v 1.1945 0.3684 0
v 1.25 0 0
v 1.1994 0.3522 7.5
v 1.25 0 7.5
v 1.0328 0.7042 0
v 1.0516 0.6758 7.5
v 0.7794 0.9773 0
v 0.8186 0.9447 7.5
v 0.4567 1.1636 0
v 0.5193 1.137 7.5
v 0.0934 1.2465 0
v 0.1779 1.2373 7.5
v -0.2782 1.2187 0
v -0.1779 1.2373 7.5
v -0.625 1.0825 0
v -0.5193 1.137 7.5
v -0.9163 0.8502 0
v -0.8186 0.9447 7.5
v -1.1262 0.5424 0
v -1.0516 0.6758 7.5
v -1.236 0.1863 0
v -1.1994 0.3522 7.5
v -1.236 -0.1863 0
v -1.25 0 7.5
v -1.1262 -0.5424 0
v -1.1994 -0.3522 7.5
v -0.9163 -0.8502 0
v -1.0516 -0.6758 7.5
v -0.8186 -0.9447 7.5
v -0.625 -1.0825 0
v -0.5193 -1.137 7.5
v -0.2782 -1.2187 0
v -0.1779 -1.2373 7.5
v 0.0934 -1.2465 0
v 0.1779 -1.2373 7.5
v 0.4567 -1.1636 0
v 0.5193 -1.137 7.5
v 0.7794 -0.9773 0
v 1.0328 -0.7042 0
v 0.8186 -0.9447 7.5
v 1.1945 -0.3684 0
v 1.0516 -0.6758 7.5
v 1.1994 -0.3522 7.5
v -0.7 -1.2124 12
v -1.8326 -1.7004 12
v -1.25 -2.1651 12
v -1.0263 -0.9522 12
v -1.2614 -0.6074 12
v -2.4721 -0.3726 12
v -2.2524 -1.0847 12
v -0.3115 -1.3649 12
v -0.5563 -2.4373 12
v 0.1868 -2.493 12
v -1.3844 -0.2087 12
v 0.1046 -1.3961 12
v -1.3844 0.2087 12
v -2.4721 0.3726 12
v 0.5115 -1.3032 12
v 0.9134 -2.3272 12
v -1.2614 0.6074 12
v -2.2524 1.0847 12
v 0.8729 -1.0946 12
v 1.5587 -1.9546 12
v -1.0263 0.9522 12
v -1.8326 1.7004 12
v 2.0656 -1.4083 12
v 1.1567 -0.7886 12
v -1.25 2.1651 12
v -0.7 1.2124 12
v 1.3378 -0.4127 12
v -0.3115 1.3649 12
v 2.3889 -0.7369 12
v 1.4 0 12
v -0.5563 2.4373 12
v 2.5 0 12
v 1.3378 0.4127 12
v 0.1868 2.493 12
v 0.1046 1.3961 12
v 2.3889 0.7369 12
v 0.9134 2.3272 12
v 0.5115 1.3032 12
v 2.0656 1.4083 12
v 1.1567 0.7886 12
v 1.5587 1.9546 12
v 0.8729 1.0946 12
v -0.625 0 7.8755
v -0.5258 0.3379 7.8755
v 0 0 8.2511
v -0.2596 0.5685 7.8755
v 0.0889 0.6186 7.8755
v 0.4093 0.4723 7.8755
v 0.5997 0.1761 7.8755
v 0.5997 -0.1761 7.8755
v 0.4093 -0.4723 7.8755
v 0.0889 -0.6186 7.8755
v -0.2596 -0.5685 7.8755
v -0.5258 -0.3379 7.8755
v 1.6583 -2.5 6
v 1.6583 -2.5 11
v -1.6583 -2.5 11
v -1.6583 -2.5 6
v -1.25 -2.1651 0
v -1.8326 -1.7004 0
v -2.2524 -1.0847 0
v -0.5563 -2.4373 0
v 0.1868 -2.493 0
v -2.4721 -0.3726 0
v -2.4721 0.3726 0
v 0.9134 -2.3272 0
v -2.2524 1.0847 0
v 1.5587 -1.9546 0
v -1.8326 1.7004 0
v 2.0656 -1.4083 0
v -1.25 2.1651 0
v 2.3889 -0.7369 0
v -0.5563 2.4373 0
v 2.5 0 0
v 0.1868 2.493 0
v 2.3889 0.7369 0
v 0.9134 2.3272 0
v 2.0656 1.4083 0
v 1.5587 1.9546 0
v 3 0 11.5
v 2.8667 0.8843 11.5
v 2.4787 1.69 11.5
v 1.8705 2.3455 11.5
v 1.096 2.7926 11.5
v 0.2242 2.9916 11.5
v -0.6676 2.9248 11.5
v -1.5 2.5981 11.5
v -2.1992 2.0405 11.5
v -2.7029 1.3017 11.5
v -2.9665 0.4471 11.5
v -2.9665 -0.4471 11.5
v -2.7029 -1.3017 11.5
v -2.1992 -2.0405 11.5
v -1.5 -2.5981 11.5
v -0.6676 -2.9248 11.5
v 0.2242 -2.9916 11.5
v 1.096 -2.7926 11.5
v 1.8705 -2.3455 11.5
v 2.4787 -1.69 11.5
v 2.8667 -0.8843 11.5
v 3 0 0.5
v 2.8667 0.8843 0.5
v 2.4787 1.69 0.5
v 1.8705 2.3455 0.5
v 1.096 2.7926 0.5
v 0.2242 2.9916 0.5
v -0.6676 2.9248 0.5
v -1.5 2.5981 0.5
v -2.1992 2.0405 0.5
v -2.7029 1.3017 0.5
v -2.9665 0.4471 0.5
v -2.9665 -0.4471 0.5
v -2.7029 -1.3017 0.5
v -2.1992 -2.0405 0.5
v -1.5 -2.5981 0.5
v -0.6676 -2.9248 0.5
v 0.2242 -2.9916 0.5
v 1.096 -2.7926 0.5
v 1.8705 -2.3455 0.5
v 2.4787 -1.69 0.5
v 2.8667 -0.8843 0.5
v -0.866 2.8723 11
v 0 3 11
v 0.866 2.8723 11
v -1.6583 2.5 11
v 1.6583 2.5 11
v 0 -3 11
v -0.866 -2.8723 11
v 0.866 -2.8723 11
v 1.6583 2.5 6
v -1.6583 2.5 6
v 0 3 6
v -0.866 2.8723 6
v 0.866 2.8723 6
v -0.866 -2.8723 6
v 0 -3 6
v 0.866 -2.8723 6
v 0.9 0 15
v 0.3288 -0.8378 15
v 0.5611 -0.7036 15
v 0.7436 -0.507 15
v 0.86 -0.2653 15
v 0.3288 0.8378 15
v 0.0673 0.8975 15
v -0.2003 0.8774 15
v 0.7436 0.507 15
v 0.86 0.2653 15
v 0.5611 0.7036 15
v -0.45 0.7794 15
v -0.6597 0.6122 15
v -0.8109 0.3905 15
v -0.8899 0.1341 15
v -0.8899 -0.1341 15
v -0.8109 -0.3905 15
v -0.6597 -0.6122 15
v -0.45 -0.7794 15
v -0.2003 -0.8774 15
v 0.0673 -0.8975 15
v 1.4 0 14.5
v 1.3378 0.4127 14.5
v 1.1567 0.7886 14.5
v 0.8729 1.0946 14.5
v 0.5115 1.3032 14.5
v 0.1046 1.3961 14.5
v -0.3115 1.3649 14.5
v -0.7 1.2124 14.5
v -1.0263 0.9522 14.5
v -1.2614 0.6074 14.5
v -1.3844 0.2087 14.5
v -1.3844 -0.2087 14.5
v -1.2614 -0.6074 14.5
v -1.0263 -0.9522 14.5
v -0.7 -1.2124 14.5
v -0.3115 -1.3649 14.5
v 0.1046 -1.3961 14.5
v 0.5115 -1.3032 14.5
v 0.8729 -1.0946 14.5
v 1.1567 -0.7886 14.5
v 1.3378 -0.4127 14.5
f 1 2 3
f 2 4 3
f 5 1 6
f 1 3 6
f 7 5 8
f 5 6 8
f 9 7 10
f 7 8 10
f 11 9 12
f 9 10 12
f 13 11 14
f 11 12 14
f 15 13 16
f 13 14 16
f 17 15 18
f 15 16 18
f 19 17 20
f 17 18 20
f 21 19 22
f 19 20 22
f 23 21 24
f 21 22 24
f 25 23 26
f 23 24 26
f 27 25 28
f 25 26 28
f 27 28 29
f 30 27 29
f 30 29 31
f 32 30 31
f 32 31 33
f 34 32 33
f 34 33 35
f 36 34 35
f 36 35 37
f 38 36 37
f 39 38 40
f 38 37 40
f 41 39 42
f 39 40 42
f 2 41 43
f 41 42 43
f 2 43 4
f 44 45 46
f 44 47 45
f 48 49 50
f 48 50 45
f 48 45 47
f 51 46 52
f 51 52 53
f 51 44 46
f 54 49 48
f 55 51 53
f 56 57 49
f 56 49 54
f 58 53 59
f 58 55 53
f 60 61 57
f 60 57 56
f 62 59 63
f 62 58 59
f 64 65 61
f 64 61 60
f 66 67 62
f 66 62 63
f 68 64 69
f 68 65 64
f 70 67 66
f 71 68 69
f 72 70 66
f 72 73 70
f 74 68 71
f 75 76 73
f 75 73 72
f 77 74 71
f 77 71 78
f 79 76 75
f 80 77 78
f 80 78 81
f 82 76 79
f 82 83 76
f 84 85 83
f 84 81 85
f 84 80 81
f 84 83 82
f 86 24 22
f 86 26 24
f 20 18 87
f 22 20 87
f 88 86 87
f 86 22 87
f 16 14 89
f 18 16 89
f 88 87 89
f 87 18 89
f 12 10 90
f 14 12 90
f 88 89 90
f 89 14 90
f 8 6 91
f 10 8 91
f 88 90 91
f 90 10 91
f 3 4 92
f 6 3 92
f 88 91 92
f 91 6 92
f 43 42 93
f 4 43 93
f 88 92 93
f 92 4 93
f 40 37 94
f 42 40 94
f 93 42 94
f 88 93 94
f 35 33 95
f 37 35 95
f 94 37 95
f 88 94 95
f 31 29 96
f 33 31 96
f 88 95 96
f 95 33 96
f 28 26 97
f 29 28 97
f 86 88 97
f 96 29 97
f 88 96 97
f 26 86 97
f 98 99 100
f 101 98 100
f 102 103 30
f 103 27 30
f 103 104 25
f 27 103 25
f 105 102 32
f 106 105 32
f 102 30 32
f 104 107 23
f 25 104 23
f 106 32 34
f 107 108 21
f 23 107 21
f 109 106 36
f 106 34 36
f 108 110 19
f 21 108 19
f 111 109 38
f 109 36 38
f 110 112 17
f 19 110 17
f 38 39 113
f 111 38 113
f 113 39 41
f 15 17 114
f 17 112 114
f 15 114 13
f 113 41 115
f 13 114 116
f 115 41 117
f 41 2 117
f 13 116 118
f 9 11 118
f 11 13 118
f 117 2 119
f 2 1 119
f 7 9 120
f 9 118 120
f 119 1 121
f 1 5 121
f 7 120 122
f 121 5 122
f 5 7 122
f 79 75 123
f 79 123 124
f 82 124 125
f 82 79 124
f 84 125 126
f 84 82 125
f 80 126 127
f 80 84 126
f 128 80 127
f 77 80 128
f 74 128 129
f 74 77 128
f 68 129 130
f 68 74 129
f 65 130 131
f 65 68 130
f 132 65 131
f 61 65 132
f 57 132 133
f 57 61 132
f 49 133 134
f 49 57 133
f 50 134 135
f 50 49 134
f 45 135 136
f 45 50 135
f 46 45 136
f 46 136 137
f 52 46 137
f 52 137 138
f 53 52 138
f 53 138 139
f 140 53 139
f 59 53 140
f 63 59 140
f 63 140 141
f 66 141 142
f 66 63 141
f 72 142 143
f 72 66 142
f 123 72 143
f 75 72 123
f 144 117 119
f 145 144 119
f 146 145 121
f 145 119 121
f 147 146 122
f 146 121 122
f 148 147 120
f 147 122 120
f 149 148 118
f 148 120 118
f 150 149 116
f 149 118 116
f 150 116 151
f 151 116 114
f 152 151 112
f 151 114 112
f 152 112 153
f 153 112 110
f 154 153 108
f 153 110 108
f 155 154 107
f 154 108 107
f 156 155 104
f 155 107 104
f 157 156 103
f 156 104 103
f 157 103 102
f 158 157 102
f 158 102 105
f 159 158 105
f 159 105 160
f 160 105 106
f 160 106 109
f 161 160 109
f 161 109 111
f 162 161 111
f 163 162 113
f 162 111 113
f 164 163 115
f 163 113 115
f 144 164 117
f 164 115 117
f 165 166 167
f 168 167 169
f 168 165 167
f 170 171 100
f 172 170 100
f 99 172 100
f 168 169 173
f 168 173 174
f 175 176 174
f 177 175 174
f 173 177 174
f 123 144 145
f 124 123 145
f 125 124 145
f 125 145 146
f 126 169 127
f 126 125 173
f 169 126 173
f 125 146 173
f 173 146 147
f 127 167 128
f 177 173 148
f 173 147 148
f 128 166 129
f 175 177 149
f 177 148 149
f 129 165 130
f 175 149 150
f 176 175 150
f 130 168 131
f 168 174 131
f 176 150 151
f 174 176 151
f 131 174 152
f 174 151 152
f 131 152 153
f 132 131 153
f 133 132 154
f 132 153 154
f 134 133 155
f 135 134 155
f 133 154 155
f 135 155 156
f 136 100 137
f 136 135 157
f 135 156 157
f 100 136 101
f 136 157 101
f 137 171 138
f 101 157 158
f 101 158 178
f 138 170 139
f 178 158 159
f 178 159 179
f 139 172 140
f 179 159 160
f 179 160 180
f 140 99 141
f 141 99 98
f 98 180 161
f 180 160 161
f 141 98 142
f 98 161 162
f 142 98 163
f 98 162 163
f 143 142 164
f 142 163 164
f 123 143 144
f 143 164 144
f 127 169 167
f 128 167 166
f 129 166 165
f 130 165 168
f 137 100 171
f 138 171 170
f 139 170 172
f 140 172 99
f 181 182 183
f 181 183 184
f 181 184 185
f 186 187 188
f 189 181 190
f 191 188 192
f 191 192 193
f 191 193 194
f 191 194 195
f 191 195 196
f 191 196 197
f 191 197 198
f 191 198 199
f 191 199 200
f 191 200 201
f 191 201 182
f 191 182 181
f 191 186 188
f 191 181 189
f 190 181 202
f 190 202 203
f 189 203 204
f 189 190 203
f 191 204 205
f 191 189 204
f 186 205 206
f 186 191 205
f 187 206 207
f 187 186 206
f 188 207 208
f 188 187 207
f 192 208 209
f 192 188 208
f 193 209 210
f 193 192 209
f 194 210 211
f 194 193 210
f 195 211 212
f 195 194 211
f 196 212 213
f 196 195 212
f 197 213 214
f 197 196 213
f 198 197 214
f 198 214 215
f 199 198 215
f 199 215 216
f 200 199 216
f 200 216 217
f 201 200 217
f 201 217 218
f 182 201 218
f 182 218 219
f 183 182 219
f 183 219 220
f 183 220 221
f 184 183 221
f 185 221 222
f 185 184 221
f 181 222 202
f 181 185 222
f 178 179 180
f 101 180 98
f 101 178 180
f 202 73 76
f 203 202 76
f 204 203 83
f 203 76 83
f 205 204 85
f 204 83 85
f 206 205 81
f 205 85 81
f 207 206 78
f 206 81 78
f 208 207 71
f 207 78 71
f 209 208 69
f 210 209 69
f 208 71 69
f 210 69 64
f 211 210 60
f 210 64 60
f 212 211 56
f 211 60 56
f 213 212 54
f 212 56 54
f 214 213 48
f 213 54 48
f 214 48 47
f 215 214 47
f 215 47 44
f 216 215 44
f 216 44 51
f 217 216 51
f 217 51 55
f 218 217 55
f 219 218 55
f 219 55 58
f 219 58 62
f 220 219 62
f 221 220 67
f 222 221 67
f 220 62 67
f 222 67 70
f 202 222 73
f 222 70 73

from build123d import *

# Parameters (mm, degrees)
SKETCH_1_R             = 3
EXTRUDE_1_DEPTH        = 12
SKETCH_2_R             = 1.4
EXTRUDE_2_DEPTH        = 3
CHAMFER_1_SIZE         = 0.5
HOLE_WIZARD_M3_1_D     = 2.5
HOLE_WIZARD_M3_1_DEPTH = 7.5
HOLE_WIZARD_M3_1_TIP   = 0.751075774
SKETCH_7_W             = 9.702446008
SKETCH_7_H             = 5
CUT_EXTRUDE_1_DEPTH    = 0.5


with BuildPart() as part:
    # 草图1 → 凸台-拉伸1 (new body)
    with BuildSketch(Plane.XY):
        Circle(SKETCH_1_R)
    extrude(amount=EXTRUDE_1_DEPTH)

    # 草图2 → 凸台-拉伸2 (add)
    with BuildSketch(Plane.XY.offset(12)):
        Circle(SKETCH_2_R)
    extrude(amount=EXTRUDE_2_DEPTH)

    # 倒角1
    chamfer_1_edges = [part.edges().sort_by_distance(p)[0] for p in [
        (-3, 0, 0),
        (-3, 0, 12),
        (-1.4, 0, 15),
    ]]
    chamfer(chamfer_1_edges, length=CHAMFER_1_SIZE)

    # M3 螺纹孔1
    with Locations(Plane(origin=(0, 0, 0), x_dir=(-1, 0, 0), z_dir=(0, 0, -1))):
        with Locations((0, 0)):
            Hole(HOLE_WIZARD_M3_1_D / 2, depth=HOLE_WIZARD_M3_1_DEPTH)
            with Locations((0, 0, -(HOLE_WIZARD_M3_1_DEPTH + HOLE_WIZARD_M3_1_TIP / 2))):  # 118° drill point
                Cone(0, HOLE_WIZARD_M3_1_D / 2, HOLE_WIZARD_M3_1_TIP, mode=Mode.SUBTRACT)

    # 草图7 → 切除-拉伸1 (cut)
    with BuildSketch(Plane(origin=(0, 3, 0), x_dir=(-1, 0, 0), z_dir=(0, 1, 0))):
        with Locations((0, 8.5)):
            Rectangle(SKETCH_7_W, SKETCH_7_H)
    cut_extrude_1 = extrude(amount=-CUT_EXTRUDE_1_DEPTH, mode=Mode.SUBTRACT)

    # 镜向1: 切除-拉伸1 across plane
    add(cut_extrude_1.mirror(Plane.ZX), mode=Mode.SUBTRACT)


solid = part.part
